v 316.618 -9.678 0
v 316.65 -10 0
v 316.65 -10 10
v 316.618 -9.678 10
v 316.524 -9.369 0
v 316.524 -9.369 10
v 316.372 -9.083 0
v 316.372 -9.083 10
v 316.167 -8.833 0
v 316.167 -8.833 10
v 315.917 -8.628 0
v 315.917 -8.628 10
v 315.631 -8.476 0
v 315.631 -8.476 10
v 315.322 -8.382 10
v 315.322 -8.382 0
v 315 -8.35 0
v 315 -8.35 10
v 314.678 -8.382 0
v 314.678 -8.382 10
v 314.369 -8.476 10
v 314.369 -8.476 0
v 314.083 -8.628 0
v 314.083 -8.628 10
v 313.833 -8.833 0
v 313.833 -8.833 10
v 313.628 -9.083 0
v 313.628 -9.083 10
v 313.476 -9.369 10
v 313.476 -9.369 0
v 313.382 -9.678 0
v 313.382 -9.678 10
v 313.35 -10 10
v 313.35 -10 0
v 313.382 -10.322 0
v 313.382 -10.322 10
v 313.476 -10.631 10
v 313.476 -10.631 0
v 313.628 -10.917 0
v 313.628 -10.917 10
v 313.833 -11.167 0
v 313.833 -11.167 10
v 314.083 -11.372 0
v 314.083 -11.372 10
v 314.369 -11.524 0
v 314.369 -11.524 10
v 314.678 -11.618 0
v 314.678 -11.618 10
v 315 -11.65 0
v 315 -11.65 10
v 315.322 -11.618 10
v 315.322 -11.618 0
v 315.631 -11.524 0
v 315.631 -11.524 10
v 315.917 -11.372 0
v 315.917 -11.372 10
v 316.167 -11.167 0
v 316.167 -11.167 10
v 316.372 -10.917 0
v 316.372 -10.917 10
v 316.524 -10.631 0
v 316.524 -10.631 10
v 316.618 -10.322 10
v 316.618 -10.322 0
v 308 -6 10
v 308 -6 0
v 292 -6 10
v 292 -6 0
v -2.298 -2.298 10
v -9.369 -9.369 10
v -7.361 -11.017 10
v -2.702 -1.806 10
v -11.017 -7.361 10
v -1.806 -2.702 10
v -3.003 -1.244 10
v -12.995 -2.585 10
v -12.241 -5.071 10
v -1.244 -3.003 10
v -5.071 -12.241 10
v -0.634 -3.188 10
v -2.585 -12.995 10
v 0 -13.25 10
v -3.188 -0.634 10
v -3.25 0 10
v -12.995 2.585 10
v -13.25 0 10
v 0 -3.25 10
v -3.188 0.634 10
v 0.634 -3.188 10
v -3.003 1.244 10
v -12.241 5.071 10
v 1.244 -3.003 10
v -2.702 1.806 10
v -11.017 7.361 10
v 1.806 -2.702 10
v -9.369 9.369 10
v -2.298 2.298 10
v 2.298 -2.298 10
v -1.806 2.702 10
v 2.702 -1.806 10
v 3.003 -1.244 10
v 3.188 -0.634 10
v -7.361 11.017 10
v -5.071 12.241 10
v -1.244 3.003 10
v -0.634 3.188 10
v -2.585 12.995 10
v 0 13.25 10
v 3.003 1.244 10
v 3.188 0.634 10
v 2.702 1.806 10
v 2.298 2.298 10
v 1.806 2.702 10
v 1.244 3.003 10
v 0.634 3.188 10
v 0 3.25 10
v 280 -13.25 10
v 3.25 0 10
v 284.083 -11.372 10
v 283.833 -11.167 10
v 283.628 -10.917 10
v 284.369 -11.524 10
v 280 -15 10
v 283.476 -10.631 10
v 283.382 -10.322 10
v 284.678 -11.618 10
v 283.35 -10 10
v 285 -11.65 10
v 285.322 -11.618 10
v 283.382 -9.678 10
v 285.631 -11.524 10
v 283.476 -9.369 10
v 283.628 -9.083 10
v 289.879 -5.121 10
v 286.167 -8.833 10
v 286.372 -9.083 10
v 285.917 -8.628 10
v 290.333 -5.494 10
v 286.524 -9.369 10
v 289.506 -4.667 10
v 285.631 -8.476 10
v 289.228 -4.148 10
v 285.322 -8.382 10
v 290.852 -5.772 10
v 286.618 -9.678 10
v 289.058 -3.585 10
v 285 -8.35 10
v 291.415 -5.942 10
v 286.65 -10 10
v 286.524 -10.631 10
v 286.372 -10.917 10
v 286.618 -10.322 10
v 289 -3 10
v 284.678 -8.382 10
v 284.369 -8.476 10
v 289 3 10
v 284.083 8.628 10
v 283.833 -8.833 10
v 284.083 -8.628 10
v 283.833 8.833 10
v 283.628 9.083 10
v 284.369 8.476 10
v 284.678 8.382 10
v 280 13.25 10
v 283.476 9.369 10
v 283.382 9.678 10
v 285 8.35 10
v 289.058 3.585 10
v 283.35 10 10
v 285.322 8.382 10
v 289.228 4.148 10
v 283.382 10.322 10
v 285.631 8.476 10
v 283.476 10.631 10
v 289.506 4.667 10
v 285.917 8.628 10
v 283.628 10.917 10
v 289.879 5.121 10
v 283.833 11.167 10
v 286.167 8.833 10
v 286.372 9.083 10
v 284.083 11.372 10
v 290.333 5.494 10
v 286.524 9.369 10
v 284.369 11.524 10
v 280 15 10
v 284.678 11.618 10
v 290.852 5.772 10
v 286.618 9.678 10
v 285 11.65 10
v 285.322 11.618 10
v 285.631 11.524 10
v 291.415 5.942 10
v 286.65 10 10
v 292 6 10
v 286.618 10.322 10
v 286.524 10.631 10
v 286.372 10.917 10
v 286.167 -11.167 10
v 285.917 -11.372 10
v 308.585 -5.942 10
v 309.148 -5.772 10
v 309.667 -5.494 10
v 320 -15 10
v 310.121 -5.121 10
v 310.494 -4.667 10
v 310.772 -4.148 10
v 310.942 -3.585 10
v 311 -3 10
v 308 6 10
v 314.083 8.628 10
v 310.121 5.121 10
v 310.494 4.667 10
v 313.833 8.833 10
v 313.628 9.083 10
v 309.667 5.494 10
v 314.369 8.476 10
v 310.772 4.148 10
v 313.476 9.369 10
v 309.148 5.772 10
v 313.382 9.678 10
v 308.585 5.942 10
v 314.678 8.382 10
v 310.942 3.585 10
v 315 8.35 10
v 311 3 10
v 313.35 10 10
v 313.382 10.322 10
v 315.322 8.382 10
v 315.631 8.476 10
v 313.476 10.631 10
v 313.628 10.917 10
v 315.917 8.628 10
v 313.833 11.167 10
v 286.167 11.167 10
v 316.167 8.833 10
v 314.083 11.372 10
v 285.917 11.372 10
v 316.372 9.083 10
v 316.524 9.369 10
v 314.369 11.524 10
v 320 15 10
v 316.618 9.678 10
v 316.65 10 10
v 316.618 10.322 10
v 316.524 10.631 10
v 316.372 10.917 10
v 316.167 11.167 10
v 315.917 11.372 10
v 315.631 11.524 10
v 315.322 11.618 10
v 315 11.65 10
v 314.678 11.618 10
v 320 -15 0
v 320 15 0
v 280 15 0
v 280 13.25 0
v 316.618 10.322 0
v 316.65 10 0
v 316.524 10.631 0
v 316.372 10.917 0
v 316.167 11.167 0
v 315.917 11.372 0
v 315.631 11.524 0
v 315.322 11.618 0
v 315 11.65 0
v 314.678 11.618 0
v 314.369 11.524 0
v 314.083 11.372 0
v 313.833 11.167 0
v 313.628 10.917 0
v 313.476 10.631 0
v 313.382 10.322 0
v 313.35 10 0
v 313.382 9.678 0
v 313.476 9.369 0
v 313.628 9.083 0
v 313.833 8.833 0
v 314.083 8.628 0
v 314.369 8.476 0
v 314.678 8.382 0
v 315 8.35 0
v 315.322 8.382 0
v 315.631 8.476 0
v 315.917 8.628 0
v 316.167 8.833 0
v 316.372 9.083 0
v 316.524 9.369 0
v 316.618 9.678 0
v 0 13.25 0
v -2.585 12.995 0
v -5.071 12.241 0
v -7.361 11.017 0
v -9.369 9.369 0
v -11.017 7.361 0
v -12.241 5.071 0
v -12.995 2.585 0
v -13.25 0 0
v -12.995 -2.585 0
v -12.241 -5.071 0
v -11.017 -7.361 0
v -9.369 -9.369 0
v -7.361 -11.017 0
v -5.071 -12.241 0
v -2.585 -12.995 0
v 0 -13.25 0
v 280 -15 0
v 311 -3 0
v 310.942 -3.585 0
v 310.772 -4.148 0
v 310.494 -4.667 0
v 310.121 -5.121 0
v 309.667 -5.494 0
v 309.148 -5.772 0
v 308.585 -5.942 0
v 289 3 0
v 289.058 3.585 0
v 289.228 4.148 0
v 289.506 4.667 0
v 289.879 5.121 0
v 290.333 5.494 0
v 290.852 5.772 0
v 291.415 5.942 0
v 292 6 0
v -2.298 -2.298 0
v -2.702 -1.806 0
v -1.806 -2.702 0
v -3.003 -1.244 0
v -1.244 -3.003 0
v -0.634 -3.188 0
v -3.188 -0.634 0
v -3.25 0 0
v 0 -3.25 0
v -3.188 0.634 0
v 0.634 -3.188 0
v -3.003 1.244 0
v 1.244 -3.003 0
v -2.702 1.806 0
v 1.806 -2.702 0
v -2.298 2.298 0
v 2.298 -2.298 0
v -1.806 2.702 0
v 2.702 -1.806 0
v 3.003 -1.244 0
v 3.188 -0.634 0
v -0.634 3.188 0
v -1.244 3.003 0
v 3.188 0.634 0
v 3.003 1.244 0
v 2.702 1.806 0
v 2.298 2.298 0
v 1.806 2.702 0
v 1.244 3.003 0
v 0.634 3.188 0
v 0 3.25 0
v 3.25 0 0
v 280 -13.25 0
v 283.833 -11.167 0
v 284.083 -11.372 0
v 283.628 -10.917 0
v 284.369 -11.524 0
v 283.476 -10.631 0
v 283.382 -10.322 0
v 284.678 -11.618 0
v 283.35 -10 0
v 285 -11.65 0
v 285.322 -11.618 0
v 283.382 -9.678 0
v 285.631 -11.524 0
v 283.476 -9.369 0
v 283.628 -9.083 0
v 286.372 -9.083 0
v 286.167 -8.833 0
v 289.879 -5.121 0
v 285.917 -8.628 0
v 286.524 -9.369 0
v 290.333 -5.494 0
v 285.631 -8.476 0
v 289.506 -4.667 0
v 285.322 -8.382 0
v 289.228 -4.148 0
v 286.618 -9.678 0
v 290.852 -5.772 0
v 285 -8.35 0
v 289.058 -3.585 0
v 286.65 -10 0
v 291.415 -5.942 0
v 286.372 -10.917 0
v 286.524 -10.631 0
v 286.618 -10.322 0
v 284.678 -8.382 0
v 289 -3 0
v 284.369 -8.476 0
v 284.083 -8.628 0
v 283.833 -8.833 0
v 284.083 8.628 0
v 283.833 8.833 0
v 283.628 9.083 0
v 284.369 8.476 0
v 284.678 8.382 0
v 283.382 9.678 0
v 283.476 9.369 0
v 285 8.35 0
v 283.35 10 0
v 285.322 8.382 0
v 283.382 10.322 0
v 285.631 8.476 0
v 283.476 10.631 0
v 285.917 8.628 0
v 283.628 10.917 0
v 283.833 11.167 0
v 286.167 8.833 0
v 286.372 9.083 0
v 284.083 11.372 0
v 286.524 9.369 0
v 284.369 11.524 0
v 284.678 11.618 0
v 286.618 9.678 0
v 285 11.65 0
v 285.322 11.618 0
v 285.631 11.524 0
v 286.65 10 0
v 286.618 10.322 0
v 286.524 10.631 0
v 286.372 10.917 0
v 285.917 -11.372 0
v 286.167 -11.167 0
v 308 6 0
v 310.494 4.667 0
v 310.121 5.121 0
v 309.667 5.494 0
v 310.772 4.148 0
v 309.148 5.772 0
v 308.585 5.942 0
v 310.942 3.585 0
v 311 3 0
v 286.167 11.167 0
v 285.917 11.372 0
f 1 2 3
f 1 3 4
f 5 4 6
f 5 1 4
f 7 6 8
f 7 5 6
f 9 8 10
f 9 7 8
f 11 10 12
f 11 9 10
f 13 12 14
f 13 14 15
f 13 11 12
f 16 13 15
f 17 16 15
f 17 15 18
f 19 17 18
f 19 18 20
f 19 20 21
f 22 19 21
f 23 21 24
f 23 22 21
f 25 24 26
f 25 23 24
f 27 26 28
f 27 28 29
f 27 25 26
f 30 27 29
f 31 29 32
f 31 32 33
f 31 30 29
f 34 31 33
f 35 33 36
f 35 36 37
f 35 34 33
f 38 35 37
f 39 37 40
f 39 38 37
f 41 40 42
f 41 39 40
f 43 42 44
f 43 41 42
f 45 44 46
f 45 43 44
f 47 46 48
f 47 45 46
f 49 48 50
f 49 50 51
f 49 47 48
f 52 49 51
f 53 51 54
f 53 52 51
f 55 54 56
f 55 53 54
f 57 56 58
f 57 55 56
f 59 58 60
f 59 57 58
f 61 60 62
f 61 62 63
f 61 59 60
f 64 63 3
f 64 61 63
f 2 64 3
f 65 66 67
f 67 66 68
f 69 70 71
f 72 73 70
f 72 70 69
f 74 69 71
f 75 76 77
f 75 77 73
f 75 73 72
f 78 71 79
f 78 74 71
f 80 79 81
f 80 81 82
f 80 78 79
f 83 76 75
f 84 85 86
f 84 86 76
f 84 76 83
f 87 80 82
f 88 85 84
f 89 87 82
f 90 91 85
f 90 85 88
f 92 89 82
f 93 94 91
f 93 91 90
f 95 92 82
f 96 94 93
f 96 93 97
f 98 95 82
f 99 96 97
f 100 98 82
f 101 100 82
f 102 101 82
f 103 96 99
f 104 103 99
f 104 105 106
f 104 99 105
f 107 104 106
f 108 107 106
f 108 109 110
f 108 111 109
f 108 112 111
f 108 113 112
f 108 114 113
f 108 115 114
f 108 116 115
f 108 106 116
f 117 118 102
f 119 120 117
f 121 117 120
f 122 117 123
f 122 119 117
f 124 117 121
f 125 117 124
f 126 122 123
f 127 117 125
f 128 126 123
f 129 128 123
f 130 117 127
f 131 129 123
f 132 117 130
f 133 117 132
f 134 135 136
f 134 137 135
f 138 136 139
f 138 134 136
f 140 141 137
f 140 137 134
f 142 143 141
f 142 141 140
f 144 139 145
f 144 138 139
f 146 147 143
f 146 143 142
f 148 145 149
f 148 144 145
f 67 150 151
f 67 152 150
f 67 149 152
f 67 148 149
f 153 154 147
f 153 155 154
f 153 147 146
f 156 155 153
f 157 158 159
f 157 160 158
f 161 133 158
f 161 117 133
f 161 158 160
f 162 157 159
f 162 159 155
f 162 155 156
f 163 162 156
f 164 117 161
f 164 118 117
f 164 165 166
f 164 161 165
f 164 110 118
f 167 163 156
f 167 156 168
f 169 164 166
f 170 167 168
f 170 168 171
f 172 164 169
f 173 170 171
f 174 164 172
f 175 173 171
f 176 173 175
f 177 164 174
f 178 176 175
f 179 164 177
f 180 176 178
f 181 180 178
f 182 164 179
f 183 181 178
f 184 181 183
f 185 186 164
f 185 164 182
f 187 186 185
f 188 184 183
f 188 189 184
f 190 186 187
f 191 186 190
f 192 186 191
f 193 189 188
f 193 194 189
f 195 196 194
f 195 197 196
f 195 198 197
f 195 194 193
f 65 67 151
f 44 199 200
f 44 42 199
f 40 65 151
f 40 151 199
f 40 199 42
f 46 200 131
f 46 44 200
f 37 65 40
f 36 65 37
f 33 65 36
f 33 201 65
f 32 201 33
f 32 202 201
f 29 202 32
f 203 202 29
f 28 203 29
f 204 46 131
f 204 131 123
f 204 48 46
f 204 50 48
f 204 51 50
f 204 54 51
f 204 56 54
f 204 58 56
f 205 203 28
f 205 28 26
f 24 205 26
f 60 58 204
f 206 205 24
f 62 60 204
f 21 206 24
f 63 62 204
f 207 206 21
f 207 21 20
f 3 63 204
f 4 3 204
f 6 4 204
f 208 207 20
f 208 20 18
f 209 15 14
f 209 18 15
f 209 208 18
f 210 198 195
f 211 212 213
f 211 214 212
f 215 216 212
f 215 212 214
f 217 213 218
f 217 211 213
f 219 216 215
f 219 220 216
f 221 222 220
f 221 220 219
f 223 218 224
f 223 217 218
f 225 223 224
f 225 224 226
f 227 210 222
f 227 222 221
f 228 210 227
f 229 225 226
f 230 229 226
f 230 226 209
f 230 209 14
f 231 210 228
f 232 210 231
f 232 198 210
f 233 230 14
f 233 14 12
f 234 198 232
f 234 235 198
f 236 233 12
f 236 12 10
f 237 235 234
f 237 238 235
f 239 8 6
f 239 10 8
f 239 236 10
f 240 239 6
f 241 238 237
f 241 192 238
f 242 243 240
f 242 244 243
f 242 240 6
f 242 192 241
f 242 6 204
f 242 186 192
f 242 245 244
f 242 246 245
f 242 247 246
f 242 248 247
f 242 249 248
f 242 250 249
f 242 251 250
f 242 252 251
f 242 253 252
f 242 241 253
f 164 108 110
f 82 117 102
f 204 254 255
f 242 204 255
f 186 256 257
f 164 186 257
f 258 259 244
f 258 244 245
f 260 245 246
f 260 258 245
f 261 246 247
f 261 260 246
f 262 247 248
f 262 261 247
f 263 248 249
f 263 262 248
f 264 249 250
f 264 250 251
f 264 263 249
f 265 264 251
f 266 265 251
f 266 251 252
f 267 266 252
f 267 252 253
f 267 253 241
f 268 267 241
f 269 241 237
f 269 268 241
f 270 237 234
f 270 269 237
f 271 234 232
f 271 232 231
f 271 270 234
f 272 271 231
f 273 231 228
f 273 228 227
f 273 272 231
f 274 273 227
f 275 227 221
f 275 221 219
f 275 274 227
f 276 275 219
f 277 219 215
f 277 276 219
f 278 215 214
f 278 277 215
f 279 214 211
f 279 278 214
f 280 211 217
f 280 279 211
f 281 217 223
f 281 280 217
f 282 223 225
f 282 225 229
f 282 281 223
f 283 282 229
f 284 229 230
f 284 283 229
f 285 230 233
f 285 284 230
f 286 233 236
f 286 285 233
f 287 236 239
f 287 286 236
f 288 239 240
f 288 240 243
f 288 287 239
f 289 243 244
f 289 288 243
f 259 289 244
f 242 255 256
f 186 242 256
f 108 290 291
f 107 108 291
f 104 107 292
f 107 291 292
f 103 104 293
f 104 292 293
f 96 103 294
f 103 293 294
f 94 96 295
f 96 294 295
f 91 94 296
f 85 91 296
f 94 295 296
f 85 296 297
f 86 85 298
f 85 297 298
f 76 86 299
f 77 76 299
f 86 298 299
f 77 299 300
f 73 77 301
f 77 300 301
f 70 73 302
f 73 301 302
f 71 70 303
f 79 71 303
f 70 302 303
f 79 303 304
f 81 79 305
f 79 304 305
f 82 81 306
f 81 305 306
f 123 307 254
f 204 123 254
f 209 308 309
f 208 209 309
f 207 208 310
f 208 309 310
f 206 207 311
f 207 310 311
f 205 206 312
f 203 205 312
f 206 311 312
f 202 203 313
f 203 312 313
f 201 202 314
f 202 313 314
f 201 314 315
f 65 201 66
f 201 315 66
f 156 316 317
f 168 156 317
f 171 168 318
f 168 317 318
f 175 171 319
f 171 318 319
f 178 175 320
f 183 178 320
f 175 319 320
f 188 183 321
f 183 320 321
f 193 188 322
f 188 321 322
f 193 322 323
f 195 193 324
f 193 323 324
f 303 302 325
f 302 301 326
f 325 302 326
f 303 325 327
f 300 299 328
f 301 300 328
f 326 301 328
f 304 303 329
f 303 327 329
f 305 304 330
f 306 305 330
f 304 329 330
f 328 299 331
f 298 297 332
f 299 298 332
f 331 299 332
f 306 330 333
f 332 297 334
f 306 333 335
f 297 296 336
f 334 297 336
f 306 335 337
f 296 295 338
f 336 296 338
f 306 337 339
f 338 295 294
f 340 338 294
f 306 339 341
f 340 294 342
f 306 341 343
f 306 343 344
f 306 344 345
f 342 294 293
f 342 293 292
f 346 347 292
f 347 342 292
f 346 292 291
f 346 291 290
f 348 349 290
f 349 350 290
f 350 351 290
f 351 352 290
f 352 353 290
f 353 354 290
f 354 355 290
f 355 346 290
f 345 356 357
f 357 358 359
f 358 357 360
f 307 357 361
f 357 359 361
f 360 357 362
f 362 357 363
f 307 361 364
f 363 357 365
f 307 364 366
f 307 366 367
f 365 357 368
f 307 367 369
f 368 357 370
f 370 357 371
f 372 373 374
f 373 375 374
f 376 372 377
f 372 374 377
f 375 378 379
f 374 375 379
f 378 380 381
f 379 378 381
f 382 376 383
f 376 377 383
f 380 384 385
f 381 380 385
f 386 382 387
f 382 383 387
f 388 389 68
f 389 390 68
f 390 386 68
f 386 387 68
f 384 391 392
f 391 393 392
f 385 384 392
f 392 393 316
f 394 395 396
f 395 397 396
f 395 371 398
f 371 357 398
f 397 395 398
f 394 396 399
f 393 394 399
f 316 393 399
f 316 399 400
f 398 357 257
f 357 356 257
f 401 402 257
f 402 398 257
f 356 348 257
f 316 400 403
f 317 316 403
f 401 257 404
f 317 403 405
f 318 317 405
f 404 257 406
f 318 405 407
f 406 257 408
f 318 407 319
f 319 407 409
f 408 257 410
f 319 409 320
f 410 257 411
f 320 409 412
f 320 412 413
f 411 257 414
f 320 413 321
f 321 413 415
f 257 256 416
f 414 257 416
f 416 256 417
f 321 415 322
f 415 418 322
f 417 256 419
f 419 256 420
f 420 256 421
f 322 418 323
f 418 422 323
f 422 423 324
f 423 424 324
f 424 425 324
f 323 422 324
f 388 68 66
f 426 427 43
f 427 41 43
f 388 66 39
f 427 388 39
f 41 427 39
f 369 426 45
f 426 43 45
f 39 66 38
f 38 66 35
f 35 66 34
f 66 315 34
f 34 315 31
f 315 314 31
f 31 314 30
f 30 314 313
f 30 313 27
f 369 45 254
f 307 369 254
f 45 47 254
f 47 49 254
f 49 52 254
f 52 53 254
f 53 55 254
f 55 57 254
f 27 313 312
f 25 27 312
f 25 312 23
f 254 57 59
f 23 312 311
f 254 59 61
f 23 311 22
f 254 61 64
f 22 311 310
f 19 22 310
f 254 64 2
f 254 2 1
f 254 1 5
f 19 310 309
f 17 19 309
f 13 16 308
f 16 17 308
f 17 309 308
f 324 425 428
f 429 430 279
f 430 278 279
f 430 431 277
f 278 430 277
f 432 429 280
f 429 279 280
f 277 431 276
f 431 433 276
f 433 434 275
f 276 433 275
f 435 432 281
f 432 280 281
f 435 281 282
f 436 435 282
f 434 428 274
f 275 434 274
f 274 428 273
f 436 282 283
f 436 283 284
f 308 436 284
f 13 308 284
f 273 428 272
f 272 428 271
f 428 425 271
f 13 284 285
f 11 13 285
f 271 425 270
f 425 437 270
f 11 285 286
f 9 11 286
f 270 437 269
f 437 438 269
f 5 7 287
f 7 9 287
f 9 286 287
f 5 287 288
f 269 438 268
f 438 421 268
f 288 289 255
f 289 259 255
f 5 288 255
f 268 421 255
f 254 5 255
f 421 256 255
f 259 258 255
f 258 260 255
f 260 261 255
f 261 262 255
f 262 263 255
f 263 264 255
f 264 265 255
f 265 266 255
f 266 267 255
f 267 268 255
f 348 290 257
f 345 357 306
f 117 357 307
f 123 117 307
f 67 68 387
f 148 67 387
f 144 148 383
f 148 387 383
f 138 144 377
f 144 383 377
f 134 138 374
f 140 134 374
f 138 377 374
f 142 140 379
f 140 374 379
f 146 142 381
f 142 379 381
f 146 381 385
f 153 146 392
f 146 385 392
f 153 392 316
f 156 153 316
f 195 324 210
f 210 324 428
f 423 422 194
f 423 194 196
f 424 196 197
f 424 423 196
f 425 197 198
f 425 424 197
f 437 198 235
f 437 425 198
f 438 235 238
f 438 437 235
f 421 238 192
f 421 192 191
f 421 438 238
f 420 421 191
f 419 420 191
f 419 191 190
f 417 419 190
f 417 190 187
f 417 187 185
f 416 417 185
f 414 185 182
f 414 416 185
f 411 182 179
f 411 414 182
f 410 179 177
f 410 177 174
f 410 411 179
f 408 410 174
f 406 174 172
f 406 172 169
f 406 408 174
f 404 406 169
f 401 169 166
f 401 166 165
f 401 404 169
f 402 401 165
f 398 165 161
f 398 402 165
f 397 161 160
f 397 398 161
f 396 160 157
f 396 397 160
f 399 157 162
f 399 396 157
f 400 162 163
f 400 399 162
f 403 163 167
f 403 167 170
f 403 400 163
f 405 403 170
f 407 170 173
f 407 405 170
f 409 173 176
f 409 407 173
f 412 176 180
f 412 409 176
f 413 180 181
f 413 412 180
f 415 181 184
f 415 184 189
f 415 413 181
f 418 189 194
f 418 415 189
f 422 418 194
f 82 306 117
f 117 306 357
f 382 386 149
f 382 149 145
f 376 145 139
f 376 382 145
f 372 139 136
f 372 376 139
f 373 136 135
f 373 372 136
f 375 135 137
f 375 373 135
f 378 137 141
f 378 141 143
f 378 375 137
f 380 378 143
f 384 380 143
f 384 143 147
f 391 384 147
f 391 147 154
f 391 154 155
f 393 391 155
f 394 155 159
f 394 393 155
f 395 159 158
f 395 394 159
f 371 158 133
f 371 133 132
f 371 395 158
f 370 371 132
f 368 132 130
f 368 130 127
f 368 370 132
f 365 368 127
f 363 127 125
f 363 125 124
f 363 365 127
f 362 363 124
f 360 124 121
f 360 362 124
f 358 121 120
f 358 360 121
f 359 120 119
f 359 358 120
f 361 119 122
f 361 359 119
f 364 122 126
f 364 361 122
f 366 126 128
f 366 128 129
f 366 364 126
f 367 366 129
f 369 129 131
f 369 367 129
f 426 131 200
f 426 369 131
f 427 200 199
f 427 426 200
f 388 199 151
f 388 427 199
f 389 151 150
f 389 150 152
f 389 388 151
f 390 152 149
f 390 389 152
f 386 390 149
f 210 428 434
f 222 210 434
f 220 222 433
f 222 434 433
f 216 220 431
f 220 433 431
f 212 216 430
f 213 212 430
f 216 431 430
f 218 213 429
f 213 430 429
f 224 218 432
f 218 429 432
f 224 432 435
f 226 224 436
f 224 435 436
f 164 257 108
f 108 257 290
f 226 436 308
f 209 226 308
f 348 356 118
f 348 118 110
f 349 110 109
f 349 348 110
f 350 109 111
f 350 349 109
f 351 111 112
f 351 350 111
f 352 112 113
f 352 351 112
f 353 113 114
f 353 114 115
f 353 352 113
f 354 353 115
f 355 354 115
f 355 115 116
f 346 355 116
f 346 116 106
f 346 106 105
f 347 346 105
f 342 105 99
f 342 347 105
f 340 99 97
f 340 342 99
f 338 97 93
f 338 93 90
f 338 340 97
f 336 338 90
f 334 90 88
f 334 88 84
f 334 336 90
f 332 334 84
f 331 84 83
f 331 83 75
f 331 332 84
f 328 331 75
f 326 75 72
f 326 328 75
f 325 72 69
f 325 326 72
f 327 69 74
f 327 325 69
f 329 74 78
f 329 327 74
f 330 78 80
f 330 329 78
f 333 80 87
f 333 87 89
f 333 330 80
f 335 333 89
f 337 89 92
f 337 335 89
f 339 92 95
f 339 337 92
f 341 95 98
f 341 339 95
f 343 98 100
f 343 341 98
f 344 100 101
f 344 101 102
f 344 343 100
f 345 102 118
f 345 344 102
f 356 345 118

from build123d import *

# Parameters (mm, degrees)
SKETCH1_R      = 3.25
SKETCH1_R_2    = 1.65
MAIN_ARM_DEPTH = 10


with BuildPart() as part:
    # Sketch1 → Main Arm (new body)
    with BuildSketch(Plane.XY):
        with BuildLine():
            Line((280, 13.25), (0, 13.25))
            ThreePointArc((0, 13.25), (-13.25, 0), (0, -13.25))
            Line((0, -13.25), (280, -13.25))
            Line((280, -13.25), (280, -15))
            Line((280, -15), (320, -15))
            Line((320, -15), (320, 15))
            Line((320, 15), (280, 15))
            Line((280, 15), (280, 13.25))
        make_face()
        Circle(SKETCH1_R, mode=Mode.SUBTRACT)
        with Locations((285, 10)):
            Circle(SKETCH1_R_2, mode=Mode.SUBTRACT)
        with Locations((285, -10)):
            Circle(SKETCH1_R_2, mode=Mode.SUBTRACT)
        with BuildLine():
            Line((308, -6), (292, -6))
            ThreePointArc((292, -6), (289.878679656, -5.121320344), (289, -3))
            Line((289, -3), (289, 3))
            ThreePointArc((289, 3), (289.878679656, 5.121320344), (292, 6))
            Line((292, 6), (308, 6))
            ThreePointArc((308, 6), (310.121320344, 5.121320344), (311, 3))
            Line((311, 3), (311, -3))
            ThreePointArc((311, -3), (310.121320344, -5.121320344), (308, -6))
        make_face(mode=Mode.SUBTRACT)
        with Locations((315, 10)):
            Circle(SKETCH1_R_2, mode=Mode.SUBTRACT)
        with Locations((315, -10)):
            Circle(SKETCH1_R_2, mode=Mode.SUBTRACT)
    extrude(amount=MAIN_ARM_DEPTH)


solid = part.part
